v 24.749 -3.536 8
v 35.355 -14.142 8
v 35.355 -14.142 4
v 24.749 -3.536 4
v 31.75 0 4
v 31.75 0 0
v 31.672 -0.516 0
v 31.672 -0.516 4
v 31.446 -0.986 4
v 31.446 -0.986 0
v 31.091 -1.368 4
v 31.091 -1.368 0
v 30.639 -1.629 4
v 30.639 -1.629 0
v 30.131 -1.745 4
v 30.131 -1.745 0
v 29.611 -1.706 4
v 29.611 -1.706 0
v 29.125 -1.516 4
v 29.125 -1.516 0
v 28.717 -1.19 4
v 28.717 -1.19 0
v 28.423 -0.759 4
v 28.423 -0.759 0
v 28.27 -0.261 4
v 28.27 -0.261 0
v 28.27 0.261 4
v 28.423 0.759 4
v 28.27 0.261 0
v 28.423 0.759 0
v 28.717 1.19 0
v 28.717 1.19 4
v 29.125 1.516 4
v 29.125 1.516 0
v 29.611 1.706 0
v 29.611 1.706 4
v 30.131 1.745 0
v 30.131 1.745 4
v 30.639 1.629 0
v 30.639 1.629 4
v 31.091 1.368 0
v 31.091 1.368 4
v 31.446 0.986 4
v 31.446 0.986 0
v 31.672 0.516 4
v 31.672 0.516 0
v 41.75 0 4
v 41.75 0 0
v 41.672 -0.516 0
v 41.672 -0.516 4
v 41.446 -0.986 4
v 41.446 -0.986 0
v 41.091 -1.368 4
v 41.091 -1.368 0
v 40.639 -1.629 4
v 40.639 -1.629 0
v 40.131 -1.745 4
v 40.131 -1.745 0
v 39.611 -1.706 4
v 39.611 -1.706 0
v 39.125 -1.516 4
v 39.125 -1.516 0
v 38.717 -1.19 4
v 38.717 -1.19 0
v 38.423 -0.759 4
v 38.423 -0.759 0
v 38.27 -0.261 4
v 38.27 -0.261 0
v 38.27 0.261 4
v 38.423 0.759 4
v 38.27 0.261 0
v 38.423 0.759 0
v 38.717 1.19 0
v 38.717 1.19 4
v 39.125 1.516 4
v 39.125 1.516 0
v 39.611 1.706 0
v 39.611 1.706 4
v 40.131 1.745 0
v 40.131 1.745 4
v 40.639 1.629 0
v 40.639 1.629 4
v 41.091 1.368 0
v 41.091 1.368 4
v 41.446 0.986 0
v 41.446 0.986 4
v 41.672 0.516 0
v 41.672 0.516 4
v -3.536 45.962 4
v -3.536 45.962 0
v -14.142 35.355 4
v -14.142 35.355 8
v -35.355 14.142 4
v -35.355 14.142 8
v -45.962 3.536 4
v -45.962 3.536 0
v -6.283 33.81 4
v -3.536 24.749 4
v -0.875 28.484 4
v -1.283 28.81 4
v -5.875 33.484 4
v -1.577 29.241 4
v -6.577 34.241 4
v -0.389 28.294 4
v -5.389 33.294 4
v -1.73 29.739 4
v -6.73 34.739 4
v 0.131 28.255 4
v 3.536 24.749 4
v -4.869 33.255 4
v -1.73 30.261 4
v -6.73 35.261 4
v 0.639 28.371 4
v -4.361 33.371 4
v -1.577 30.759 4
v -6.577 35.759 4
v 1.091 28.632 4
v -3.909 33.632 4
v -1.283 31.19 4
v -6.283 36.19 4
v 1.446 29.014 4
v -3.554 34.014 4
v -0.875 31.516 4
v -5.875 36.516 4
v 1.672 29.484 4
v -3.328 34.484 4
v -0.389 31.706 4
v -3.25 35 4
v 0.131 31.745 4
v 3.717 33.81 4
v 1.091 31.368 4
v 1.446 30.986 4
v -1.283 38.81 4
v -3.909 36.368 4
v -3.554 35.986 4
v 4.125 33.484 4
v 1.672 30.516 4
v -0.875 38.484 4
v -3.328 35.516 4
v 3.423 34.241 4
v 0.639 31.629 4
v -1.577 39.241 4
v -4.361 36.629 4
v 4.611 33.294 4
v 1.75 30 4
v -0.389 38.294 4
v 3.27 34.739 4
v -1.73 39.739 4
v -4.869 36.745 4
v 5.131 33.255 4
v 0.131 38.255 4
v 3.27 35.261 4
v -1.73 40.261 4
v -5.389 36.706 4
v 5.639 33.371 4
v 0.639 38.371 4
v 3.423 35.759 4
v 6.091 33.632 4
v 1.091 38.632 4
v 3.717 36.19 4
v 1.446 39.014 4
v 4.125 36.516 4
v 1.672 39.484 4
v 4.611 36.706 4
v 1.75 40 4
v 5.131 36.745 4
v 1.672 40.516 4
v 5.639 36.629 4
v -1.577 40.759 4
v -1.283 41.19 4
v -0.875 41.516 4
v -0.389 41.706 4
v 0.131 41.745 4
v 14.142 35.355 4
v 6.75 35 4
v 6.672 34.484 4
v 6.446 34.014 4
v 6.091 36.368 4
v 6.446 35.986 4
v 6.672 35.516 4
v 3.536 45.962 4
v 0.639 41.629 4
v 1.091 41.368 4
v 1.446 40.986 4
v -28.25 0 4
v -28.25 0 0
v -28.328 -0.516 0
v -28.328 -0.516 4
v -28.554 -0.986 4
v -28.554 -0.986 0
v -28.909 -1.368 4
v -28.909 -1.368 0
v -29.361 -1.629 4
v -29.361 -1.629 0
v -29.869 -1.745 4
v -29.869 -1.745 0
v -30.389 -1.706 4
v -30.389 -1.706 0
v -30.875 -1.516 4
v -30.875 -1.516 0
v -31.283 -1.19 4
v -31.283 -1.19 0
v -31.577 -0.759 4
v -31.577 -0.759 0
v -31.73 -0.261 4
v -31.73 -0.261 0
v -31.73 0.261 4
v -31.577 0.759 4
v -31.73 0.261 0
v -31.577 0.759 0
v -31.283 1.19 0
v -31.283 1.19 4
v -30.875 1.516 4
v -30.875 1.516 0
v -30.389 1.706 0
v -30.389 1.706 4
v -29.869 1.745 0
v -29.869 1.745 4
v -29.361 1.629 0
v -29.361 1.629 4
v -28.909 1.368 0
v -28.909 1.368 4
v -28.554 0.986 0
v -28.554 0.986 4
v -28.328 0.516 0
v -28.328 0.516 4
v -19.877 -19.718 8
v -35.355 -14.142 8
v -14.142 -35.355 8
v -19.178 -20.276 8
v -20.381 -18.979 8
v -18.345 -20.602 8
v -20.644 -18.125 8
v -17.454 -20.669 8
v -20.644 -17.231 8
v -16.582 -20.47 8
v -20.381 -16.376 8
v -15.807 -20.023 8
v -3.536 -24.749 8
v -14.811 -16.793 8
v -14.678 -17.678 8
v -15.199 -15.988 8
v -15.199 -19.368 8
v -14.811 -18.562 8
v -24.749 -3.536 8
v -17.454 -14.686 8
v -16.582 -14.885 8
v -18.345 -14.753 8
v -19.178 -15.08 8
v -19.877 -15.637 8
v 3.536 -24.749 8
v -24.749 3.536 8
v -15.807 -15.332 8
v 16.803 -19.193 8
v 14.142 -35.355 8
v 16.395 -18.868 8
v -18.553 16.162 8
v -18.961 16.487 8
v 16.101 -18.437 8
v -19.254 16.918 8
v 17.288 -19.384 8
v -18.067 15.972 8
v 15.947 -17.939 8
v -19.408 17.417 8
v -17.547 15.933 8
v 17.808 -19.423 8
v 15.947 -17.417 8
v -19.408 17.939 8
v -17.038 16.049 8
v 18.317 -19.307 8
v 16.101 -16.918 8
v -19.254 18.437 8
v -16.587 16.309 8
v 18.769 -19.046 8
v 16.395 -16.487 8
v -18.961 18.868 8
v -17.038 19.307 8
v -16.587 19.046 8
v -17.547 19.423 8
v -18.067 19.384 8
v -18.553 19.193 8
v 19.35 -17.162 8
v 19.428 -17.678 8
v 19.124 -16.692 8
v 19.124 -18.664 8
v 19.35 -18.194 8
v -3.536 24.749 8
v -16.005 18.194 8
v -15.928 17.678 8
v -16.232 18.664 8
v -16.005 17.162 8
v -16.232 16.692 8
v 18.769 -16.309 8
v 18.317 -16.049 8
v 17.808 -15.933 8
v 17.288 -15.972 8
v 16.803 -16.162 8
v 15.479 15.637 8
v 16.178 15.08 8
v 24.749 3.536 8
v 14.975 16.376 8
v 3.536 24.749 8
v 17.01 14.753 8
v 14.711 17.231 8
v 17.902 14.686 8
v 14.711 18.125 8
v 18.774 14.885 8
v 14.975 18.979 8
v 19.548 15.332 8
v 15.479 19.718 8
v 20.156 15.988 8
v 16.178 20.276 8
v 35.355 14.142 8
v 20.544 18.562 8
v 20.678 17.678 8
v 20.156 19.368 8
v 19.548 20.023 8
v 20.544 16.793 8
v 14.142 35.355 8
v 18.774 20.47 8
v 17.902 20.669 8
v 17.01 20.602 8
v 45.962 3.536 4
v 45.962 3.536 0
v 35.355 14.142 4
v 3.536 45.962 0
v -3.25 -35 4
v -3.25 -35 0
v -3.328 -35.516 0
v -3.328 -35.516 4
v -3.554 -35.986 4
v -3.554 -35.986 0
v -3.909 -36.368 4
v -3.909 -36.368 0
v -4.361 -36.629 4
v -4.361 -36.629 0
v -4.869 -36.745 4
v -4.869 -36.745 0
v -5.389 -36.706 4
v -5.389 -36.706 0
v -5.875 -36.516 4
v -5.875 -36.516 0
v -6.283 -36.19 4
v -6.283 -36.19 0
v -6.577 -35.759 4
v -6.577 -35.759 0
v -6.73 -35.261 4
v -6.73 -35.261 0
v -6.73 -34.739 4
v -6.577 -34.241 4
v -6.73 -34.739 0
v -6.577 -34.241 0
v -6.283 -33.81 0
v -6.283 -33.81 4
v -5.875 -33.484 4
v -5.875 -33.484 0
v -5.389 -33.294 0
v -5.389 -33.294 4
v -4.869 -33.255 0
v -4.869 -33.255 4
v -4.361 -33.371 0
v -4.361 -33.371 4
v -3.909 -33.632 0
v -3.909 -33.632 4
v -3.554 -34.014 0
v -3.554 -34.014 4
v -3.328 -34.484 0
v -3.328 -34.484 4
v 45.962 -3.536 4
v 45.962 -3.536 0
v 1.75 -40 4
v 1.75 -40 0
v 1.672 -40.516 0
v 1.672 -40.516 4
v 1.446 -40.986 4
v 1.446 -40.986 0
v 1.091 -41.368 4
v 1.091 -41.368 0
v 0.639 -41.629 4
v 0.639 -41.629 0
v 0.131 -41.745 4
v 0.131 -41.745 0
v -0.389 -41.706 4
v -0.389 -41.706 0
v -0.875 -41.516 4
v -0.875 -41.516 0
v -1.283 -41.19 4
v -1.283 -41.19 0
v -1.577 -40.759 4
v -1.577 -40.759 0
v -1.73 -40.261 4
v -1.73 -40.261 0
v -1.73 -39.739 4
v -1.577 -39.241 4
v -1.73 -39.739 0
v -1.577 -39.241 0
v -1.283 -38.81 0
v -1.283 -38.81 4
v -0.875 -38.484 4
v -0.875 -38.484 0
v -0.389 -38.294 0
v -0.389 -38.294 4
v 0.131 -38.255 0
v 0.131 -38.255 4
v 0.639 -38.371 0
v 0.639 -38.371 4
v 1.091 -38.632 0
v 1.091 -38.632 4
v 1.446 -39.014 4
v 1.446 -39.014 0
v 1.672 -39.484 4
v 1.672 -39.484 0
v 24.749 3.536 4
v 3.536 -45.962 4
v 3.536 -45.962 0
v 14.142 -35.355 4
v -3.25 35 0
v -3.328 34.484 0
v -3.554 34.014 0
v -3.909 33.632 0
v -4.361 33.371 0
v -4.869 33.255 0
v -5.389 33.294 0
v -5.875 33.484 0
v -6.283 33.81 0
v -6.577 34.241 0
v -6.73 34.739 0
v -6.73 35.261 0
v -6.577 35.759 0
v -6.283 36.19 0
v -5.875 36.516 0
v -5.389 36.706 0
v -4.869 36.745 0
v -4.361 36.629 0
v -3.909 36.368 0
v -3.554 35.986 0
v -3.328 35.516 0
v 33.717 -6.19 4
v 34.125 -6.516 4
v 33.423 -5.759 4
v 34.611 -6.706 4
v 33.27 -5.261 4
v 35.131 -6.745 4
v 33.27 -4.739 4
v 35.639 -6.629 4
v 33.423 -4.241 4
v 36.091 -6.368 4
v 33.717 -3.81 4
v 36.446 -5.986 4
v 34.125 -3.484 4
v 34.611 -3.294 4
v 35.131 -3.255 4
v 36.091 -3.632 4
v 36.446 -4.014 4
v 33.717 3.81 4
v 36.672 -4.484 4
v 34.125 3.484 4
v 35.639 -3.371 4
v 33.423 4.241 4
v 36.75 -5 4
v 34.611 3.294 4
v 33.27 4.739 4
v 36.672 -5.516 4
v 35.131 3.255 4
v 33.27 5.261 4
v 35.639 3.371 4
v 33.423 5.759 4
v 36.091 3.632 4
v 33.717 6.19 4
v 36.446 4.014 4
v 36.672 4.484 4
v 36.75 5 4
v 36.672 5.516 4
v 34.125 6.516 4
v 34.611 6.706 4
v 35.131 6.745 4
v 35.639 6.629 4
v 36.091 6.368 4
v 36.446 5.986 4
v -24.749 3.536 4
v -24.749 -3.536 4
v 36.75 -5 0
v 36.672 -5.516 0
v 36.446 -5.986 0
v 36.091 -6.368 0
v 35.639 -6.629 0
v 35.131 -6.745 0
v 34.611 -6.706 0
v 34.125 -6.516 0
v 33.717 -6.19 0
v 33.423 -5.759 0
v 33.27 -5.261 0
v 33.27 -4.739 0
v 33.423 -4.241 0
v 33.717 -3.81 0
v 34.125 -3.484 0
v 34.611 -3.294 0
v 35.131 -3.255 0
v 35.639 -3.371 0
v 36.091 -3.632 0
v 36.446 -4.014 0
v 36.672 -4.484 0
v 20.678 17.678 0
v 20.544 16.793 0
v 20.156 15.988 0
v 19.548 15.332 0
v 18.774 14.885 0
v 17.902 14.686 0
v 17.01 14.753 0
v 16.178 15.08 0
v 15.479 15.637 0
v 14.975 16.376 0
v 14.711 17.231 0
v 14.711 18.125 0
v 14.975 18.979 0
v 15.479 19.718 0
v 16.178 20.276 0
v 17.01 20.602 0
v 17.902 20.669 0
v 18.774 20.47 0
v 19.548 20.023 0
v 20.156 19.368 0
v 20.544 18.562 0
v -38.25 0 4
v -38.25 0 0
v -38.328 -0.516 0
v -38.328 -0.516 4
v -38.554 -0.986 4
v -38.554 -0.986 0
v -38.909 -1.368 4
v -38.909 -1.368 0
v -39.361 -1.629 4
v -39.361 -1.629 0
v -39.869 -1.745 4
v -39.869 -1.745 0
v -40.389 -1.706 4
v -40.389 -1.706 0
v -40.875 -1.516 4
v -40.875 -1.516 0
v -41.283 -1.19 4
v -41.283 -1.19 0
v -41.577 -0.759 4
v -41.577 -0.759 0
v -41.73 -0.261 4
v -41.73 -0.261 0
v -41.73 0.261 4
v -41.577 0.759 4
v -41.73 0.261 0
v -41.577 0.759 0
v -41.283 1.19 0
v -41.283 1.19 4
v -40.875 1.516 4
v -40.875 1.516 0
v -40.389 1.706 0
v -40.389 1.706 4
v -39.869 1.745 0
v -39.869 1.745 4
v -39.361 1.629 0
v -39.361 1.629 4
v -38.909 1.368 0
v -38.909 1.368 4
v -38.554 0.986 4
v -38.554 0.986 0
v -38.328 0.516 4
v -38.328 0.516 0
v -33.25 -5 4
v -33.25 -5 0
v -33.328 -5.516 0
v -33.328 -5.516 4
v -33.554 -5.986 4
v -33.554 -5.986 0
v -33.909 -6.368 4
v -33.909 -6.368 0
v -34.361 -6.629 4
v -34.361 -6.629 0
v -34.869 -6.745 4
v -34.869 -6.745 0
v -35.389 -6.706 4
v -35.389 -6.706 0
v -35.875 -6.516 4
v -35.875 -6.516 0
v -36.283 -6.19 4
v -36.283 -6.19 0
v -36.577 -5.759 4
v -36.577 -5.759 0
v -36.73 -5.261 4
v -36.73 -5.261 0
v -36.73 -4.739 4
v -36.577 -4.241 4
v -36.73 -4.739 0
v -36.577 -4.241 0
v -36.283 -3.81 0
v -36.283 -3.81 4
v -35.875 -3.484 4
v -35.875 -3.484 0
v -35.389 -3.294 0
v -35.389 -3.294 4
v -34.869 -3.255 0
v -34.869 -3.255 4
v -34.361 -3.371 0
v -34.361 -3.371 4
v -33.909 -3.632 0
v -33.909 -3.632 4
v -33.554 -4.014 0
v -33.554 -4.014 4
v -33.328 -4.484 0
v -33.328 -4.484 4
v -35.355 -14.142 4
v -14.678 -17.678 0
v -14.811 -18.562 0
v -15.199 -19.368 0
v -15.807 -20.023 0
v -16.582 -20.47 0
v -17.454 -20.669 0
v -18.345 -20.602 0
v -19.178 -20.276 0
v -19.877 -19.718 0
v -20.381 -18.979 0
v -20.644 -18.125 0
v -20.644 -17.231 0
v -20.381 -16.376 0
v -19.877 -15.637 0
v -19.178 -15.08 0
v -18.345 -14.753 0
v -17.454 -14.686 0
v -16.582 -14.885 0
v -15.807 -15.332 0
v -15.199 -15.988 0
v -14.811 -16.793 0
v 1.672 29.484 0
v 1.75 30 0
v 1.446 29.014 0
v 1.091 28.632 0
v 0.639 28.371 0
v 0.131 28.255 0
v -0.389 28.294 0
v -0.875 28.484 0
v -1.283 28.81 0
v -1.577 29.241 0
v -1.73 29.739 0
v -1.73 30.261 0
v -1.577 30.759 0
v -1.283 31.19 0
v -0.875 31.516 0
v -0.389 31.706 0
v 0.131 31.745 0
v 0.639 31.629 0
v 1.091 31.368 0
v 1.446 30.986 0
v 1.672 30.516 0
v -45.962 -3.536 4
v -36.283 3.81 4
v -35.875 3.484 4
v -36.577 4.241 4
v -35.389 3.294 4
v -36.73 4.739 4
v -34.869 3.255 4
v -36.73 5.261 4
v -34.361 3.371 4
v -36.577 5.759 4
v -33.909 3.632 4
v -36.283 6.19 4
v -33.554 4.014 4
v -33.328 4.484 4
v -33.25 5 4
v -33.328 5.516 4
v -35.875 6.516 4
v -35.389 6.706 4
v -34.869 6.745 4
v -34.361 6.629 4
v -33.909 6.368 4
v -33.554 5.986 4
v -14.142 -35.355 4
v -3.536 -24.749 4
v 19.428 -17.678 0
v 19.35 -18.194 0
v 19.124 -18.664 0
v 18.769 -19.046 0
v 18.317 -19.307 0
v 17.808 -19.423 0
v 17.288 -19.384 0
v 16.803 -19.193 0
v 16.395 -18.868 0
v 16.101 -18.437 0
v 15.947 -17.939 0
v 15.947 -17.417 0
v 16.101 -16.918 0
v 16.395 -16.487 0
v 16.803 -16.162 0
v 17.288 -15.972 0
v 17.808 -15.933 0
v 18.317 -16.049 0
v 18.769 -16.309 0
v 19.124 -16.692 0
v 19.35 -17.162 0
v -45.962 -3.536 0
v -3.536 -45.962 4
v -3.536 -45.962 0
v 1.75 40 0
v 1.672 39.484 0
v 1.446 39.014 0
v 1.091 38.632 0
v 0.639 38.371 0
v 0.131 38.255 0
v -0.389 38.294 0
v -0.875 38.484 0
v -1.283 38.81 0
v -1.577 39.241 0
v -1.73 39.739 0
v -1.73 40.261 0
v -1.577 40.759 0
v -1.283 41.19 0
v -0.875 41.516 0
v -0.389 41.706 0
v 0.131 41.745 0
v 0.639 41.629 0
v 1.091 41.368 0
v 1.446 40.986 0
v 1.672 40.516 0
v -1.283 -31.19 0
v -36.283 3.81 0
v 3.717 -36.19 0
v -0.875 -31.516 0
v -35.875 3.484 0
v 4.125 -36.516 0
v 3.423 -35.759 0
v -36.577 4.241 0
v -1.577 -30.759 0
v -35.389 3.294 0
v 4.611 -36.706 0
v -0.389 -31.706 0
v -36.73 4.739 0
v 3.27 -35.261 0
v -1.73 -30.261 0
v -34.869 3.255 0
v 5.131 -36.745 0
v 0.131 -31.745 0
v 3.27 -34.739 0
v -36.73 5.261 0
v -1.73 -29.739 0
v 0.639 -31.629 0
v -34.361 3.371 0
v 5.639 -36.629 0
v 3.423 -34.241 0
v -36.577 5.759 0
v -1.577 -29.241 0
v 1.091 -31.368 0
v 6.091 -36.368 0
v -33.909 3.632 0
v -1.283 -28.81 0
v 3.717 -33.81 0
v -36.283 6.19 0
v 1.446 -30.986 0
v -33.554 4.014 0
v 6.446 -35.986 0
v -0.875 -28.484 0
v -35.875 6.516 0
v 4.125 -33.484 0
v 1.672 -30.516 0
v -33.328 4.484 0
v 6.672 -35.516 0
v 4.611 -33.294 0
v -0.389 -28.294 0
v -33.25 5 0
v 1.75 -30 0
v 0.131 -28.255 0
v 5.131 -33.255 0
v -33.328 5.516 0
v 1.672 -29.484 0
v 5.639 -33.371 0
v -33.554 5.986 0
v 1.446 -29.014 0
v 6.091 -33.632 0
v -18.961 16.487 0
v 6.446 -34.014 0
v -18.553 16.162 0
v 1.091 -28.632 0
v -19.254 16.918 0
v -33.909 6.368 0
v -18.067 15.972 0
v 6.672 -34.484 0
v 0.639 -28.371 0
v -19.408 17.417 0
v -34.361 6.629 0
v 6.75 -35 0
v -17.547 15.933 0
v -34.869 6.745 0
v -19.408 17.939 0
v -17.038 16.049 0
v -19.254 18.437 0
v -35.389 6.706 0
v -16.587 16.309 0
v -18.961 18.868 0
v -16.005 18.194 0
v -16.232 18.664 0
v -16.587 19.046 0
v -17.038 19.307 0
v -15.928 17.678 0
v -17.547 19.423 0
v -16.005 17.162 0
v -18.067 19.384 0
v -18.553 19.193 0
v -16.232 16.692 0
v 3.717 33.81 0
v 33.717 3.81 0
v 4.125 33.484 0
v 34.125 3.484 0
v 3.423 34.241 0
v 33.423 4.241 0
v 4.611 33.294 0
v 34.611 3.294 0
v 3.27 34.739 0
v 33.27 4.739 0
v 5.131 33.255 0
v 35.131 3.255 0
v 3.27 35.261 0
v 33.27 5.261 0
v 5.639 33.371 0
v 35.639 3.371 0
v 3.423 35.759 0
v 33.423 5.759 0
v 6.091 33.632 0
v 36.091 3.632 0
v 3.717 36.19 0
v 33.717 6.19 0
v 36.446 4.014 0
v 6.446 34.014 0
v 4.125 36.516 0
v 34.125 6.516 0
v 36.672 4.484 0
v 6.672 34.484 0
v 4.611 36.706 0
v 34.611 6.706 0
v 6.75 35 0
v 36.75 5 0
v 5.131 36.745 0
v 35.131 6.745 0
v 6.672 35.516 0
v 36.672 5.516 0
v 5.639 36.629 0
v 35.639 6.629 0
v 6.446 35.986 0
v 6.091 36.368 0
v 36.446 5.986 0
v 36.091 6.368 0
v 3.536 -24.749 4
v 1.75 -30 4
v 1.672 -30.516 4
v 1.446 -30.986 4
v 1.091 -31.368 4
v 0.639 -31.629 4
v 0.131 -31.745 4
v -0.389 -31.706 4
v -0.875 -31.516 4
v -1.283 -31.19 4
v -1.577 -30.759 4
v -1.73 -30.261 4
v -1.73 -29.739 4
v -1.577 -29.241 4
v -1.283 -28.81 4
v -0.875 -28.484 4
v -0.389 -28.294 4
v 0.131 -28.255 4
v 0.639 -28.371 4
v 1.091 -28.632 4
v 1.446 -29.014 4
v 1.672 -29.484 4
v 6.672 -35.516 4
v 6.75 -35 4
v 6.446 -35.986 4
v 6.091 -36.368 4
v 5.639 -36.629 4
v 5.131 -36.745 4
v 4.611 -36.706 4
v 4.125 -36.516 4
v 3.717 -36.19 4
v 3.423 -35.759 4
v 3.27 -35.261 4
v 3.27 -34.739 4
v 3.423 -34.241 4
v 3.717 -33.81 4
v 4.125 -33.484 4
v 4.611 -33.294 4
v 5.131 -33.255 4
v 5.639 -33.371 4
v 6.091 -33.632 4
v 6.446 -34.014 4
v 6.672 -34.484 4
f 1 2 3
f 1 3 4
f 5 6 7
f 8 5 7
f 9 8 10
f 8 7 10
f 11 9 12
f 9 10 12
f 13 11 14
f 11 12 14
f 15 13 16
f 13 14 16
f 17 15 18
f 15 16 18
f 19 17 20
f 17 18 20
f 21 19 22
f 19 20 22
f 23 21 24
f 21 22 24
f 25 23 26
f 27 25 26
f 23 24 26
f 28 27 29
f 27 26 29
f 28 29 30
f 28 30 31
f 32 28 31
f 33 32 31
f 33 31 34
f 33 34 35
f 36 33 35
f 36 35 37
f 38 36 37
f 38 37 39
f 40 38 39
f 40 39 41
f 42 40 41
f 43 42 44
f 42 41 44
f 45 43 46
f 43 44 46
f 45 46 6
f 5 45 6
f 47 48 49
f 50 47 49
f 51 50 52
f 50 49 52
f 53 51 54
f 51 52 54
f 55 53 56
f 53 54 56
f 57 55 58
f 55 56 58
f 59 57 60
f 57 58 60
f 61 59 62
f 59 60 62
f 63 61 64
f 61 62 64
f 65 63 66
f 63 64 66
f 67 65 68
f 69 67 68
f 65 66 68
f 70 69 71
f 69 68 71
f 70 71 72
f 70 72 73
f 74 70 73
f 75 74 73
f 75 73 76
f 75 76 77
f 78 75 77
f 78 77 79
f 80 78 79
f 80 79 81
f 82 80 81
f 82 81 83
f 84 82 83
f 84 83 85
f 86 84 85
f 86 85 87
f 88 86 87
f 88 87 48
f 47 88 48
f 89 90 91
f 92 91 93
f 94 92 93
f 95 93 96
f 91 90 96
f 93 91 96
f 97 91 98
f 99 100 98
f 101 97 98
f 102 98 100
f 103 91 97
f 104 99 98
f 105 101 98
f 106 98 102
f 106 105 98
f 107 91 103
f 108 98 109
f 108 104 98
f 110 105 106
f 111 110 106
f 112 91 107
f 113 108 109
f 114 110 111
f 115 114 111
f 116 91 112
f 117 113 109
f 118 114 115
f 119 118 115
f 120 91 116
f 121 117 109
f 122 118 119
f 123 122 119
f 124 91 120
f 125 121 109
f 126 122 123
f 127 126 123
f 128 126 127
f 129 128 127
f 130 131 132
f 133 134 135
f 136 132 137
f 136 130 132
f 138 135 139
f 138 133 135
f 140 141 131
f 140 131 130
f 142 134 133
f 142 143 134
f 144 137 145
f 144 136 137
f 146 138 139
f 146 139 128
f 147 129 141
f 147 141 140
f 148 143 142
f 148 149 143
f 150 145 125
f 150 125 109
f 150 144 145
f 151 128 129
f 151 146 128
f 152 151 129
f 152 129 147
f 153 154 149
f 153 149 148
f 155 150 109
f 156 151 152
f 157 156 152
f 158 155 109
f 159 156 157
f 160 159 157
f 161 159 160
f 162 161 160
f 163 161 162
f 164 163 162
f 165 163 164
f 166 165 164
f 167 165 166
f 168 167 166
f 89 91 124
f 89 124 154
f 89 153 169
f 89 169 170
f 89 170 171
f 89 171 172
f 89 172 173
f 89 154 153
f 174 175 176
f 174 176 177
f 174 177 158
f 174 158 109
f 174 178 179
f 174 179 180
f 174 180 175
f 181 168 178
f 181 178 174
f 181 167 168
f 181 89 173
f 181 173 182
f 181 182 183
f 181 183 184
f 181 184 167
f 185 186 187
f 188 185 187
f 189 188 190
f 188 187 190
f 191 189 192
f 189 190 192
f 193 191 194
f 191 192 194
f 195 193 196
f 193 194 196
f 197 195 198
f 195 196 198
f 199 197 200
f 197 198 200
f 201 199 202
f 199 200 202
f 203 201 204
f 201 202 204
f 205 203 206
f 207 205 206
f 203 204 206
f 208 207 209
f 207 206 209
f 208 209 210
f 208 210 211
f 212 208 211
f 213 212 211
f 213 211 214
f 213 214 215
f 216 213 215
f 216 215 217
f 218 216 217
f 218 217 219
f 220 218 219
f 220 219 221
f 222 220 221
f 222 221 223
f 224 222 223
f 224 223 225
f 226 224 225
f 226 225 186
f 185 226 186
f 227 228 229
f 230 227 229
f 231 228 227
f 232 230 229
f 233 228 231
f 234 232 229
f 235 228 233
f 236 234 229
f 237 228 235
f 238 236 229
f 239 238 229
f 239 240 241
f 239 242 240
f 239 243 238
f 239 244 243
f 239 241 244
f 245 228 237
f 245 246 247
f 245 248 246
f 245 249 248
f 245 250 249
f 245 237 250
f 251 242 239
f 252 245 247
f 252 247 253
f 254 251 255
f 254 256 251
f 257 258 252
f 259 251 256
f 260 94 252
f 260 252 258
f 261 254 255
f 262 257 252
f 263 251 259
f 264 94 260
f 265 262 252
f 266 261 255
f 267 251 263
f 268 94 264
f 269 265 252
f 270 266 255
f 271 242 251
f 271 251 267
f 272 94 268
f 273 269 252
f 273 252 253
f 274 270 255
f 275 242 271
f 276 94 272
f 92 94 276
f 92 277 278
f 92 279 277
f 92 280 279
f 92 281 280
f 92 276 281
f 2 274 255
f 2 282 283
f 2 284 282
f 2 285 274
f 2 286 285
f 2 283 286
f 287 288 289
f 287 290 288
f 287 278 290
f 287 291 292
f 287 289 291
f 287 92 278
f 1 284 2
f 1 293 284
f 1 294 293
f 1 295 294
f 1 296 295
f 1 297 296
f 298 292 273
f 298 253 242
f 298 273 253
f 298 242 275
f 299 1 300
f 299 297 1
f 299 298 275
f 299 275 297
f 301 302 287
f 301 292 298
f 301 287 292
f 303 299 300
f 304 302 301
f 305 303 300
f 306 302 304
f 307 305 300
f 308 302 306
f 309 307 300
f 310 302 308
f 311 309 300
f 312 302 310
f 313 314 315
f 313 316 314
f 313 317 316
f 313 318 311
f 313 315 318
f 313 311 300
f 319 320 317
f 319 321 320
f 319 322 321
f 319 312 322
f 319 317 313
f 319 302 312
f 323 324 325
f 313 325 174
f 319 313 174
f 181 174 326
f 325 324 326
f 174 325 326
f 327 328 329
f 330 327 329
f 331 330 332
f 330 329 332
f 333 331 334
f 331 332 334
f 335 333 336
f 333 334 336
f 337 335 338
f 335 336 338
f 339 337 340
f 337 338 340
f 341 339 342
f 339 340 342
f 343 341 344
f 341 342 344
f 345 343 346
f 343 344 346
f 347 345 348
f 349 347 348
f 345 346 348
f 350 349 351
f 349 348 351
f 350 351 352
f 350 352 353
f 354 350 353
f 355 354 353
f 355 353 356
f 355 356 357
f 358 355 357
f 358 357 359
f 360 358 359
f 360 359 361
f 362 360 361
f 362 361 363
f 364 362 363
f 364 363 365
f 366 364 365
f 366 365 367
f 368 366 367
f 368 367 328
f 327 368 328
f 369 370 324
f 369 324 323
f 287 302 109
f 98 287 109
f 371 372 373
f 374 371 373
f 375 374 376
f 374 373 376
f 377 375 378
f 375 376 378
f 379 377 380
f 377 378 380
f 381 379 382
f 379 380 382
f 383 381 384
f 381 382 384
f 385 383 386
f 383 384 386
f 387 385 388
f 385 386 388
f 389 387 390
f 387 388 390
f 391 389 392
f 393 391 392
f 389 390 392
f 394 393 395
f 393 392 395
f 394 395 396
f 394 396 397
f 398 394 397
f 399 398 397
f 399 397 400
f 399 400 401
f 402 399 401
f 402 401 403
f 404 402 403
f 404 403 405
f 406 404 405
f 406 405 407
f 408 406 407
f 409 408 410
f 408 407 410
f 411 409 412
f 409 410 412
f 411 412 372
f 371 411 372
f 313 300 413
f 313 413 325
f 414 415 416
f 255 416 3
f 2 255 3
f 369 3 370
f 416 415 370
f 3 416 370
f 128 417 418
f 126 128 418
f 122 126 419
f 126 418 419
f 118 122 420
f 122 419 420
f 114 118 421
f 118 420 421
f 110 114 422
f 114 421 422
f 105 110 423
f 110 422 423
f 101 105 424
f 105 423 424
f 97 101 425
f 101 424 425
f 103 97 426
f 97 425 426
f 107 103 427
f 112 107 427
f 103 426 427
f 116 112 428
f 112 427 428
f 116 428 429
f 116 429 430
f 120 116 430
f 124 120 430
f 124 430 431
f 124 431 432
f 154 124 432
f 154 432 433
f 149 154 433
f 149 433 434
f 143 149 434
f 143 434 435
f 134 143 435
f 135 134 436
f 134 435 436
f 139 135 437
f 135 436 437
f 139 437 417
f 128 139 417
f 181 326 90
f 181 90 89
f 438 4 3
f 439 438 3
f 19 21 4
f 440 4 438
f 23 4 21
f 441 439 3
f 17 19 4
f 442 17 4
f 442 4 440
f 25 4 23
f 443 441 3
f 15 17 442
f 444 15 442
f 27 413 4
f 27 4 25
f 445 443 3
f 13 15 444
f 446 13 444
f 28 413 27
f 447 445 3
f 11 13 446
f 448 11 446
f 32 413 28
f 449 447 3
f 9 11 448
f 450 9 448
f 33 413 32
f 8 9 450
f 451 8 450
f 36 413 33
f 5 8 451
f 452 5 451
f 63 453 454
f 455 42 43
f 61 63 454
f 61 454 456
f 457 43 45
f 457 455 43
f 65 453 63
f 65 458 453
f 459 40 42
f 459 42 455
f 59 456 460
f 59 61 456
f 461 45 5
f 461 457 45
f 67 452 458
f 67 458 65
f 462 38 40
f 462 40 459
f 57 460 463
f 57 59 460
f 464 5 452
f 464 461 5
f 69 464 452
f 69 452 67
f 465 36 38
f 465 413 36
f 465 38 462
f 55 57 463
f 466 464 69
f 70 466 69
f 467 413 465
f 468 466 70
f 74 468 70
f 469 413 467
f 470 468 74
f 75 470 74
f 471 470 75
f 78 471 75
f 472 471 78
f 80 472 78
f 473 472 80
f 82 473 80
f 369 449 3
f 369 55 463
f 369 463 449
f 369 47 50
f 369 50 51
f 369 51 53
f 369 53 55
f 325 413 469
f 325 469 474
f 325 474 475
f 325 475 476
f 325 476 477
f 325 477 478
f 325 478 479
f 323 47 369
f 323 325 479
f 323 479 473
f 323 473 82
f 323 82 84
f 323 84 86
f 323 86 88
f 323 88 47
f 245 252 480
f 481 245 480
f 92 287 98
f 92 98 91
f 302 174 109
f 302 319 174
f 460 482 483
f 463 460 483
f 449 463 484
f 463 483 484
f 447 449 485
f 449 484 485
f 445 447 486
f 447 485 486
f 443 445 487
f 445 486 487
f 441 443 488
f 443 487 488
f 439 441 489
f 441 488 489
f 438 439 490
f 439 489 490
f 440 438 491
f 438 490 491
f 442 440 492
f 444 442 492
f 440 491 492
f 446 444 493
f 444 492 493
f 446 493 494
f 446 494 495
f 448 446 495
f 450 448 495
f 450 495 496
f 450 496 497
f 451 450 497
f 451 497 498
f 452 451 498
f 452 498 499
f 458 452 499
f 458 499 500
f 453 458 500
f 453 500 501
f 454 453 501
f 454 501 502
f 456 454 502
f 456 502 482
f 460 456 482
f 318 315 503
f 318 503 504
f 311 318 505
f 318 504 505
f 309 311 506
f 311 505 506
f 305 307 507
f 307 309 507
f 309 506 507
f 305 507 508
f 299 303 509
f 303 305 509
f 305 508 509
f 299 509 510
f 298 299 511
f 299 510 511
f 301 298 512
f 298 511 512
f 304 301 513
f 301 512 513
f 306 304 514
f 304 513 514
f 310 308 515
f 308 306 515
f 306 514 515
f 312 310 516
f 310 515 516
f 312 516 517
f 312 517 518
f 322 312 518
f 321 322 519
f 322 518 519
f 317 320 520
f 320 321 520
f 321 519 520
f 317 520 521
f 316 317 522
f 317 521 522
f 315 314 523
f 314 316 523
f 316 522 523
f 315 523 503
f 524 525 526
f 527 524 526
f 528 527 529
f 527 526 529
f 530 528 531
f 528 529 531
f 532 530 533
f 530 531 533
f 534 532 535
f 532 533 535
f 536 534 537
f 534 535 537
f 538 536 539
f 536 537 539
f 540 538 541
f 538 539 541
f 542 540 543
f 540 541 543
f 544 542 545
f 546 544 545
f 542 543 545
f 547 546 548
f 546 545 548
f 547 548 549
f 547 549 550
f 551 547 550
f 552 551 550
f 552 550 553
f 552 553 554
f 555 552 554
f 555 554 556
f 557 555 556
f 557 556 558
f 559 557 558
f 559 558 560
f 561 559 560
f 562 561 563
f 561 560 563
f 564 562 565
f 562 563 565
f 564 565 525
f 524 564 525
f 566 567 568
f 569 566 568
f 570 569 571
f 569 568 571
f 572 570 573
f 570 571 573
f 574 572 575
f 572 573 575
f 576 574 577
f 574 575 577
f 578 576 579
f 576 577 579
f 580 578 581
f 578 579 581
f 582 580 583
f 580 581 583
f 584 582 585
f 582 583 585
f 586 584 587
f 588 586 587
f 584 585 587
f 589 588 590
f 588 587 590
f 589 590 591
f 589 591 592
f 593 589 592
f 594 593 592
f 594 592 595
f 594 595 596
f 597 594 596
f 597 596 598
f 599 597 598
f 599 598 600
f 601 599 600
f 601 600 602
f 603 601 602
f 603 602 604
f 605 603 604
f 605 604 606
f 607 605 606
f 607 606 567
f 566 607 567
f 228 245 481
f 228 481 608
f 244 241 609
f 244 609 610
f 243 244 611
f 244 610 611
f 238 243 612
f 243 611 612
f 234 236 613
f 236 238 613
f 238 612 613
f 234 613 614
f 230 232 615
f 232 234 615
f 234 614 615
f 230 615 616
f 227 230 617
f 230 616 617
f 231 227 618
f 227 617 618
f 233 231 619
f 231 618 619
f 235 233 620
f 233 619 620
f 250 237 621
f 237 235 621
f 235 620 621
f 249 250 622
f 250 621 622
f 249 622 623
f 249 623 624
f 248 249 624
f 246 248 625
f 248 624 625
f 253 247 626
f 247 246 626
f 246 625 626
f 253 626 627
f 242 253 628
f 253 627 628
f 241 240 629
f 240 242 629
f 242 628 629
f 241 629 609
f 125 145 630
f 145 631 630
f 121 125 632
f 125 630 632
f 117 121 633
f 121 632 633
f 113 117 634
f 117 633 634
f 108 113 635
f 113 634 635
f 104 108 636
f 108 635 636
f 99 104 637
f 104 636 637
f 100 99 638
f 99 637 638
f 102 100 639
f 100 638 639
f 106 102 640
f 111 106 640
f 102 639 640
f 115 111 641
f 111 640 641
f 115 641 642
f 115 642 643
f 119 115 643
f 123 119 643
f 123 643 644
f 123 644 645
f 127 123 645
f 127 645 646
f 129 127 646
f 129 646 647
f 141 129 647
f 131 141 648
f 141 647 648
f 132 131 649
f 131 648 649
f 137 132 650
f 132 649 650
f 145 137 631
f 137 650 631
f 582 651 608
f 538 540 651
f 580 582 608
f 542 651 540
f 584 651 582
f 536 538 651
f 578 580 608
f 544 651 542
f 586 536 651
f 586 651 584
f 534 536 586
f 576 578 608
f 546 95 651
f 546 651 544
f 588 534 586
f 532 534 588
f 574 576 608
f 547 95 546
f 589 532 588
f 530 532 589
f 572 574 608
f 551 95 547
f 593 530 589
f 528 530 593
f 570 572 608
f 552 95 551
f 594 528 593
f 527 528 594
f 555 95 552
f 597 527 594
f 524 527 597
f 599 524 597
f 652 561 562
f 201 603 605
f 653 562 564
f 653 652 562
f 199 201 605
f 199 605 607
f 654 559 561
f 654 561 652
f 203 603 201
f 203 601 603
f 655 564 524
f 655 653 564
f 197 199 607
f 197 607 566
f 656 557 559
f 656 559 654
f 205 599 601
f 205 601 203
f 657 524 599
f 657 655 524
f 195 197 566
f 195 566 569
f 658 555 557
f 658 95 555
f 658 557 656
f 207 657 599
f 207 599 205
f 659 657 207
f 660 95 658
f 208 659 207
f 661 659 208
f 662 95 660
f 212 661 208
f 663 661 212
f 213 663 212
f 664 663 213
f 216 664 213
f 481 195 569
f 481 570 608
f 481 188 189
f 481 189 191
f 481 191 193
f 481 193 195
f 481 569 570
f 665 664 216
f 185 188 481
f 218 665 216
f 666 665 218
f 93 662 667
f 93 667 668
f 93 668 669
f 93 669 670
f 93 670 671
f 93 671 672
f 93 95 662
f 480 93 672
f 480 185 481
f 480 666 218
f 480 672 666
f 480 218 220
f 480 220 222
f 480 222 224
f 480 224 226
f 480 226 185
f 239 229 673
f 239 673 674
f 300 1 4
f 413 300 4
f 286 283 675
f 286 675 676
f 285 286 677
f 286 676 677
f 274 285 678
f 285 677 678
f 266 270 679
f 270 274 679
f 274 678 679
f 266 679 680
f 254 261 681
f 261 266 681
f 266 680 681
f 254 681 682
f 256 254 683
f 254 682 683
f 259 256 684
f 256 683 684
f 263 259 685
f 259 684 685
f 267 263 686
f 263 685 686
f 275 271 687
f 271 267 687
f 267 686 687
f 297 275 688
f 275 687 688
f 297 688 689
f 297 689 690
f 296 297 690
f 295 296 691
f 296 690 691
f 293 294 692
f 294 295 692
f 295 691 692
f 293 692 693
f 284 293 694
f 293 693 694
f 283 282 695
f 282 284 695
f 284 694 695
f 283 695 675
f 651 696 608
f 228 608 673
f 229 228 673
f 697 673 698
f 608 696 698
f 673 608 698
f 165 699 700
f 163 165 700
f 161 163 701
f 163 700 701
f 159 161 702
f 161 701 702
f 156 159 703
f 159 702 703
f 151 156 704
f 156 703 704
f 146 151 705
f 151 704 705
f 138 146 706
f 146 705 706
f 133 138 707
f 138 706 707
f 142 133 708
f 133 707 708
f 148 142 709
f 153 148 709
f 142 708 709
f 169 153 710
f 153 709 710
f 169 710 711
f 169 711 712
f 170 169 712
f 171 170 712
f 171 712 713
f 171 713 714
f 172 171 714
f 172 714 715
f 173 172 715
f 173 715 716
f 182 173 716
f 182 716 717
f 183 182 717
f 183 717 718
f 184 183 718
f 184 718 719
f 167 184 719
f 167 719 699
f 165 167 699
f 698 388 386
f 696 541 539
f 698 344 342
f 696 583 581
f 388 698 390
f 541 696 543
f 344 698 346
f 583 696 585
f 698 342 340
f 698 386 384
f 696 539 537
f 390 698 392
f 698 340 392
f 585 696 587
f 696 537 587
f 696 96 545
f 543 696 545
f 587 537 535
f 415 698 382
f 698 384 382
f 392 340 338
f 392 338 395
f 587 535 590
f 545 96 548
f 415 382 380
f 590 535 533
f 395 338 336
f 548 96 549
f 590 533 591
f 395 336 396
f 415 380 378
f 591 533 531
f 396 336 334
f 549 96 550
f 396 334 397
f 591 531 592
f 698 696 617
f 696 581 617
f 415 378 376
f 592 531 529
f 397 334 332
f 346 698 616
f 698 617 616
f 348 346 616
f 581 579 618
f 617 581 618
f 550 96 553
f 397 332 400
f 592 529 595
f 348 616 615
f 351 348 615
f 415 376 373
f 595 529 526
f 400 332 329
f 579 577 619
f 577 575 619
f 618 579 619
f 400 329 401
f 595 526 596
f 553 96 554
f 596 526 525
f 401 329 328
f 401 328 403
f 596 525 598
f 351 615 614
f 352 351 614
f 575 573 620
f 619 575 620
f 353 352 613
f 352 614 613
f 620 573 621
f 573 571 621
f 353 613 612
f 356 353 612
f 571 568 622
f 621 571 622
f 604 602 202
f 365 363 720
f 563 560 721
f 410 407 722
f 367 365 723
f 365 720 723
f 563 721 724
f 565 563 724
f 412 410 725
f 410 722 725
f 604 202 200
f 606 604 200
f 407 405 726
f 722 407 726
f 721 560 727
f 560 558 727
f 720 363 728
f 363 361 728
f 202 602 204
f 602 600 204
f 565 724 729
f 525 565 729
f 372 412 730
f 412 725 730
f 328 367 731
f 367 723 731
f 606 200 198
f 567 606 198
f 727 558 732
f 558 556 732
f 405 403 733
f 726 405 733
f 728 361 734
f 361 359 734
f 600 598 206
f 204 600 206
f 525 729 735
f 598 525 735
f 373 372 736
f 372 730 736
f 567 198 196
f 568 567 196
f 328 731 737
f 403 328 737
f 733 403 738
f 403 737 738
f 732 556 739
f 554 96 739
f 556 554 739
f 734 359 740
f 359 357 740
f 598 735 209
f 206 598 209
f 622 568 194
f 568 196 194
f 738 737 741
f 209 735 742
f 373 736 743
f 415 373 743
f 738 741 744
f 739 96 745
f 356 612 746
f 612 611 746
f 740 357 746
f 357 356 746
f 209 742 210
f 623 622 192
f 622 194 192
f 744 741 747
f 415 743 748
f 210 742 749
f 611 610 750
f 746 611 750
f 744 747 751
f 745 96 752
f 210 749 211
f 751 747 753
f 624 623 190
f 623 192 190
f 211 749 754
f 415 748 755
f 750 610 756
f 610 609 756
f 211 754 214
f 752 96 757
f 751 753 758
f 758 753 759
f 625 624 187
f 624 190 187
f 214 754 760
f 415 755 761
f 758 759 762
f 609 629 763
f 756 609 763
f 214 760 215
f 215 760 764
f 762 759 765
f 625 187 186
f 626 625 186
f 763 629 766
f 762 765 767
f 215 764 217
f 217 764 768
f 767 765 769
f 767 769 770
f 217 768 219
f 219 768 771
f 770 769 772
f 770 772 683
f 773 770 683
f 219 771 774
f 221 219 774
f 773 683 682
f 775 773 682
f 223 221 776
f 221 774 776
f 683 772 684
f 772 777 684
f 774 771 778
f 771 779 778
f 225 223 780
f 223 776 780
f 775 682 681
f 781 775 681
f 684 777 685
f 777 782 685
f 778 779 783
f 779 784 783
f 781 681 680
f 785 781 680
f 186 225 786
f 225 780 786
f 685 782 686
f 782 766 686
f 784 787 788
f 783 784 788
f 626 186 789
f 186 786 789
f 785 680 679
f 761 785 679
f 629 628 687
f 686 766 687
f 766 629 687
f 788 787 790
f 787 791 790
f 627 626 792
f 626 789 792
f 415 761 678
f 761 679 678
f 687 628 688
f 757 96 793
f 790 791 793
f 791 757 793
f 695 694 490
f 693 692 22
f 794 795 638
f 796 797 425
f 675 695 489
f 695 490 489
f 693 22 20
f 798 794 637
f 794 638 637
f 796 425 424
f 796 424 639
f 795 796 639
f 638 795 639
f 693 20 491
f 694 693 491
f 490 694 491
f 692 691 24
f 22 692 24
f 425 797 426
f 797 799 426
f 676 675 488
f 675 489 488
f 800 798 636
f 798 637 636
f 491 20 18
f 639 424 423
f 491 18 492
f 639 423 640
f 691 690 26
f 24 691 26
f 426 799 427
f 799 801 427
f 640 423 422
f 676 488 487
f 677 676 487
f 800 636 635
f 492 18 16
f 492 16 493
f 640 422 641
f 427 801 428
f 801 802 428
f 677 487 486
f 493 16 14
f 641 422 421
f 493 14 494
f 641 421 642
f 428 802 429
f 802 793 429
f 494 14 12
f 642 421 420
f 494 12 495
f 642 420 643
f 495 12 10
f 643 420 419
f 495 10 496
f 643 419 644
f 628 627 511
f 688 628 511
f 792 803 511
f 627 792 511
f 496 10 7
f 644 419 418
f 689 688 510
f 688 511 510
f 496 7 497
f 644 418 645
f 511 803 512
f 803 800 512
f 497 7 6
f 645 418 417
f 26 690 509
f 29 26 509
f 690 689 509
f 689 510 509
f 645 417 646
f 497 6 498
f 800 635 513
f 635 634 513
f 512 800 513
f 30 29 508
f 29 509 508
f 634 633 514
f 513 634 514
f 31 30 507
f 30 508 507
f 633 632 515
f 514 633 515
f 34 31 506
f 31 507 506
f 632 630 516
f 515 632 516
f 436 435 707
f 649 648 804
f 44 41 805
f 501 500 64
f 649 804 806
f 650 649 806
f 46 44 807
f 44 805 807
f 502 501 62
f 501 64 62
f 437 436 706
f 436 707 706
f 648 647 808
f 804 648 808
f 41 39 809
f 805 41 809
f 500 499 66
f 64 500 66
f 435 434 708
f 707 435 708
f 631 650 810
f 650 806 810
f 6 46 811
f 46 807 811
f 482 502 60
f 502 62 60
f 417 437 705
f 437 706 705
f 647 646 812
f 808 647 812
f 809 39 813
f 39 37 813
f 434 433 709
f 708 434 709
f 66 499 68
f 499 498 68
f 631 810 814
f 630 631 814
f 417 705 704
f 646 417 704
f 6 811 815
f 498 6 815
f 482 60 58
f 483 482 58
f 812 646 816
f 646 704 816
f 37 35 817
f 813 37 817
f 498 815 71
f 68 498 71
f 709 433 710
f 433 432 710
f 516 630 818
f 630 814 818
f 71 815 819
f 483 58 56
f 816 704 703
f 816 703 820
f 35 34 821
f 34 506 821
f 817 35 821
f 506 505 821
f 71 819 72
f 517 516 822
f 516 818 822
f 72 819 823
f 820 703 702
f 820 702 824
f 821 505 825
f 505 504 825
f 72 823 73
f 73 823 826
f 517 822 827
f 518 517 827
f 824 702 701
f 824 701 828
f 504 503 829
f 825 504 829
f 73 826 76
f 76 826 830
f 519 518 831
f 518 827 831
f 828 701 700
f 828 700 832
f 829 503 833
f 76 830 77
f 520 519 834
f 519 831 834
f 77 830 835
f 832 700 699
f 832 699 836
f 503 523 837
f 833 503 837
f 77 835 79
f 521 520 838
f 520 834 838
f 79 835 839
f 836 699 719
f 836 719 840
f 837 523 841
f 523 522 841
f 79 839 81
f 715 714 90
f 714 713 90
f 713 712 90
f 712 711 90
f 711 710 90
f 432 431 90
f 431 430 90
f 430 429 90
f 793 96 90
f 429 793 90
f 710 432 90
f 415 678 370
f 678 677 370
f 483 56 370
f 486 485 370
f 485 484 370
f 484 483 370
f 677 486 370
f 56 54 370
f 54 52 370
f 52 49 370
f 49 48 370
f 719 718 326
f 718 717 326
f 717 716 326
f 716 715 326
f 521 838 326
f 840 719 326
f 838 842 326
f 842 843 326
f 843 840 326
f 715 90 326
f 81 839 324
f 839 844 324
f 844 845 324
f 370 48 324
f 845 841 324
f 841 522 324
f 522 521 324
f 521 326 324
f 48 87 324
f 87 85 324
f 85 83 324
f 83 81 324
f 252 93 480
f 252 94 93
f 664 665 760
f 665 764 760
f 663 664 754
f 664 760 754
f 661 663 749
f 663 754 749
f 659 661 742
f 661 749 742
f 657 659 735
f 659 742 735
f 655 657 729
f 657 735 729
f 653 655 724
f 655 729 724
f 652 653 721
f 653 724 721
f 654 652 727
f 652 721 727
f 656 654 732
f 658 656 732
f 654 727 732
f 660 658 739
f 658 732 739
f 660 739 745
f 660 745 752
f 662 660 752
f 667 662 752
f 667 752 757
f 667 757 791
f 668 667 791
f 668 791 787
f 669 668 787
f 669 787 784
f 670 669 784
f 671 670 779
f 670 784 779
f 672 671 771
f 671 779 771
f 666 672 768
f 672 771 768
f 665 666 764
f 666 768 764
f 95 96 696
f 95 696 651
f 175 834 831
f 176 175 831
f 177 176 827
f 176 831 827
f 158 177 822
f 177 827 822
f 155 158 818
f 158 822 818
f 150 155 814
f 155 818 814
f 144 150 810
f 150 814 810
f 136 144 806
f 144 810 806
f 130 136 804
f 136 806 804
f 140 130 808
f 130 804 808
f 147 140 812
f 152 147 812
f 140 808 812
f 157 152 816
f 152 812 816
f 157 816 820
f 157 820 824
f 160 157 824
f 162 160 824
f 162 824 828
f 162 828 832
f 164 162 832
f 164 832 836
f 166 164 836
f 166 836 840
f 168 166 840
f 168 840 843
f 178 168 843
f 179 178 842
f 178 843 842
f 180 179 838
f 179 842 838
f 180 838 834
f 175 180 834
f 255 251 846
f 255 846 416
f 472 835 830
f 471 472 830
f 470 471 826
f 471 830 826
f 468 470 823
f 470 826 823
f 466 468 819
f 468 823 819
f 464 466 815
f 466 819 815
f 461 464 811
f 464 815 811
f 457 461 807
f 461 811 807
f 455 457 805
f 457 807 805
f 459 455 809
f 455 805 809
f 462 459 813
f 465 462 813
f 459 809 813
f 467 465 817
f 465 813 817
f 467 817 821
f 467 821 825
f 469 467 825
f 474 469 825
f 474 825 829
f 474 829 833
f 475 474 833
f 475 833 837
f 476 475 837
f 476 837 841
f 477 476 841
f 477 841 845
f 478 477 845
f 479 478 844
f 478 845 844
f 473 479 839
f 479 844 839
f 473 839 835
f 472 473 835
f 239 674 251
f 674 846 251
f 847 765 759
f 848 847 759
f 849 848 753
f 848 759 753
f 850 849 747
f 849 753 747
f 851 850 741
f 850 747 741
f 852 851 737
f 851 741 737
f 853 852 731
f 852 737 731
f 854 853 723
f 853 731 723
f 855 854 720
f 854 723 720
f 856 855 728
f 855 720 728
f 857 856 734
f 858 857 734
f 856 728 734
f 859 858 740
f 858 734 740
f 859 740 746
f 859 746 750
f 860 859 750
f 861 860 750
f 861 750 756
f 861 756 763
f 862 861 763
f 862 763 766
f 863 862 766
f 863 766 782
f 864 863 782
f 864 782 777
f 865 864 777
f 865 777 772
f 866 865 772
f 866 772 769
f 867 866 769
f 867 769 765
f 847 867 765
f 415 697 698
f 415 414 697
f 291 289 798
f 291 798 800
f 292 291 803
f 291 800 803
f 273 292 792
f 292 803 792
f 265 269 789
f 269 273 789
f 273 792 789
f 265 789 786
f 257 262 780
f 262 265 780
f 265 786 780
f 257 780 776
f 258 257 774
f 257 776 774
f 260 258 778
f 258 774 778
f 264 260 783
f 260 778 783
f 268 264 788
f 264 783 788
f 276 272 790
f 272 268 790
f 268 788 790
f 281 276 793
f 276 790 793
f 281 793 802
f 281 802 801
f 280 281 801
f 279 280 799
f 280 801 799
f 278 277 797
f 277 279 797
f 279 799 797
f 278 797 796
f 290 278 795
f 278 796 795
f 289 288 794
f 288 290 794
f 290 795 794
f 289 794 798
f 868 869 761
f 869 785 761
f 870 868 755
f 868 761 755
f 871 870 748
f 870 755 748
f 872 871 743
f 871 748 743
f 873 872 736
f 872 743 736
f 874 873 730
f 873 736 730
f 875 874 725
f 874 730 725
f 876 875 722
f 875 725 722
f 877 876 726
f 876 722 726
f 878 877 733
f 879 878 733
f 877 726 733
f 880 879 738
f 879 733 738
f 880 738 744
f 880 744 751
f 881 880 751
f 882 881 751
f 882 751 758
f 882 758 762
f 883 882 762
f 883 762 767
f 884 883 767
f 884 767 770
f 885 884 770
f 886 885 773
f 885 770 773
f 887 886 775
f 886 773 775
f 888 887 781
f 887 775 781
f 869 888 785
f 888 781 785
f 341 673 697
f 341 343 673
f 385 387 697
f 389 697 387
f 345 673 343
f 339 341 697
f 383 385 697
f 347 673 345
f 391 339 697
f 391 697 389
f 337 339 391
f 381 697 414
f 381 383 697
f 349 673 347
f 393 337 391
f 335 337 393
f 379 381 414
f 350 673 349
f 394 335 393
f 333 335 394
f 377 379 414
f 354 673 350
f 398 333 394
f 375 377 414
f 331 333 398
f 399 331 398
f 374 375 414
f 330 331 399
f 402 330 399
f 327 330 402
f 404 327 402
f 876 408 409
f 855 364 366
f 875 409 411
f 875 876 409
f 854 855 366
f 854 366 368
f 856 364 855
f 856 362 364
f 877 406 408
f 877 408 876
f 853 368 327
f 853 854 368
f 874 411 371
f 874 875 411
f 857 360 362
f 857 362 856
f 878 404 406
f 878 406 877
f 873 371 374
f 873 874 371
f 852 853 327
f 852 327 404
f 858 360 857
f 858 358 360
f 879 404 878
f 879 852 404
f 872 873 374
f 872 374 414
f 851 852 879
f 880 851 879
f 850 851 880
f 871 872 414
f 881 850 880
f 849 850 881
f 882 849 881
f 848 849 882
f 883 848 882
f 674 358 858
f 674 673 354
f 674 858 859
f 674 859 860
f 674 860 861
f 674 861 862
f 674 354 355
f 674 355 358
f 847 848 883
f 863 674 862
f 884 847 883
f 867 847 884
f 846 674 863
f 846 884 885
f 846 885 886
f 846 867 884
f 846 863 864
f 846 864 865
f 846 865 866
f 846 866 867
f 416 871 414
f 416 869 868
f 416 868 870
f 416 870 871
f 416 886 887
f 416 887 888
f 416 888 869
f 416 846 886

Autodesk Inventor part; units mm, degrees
ref_plane "YZ Plane" through (0, 0, 0) normal (1, 0, 0) x (0, 1, 0)
ref_plane "XZ Plane" through (0, 0, 0) normal (0, 1, 0) x (-1, 0, 0)
ref_plane "XY Plane" through (0, 0, 0) normal (0, 0, 1) x (1, 0, 0)
sketch "スケッチ2" plane through (0, 0, 0) normal (0, 0, 1) x (1, 0, 0)
  line L0 (0, -49.4975) -> (49.4975, 0)
  line L1 (49.4975, 0) -> (0, 49.4975)
  line L2 (0, 49.4975) -> (-49.4975, 0)
  line L3 (-49.4975, 0) -> (0, -49.4975)
  line L4 (0, -49.4975) -> (0, 49.4975) construction
  line L5 (49.4975, 0) -> (-49.4975, 0) construction
  circle A0 centre (-5, 35) radius 1.75
  circle A1 centre (5, 35) radius 1.75
  circle A2 centre (-35, -5) radius 1.75
  circle A3 centre (-35, 5) radius 1.75
  circle A4 centre (5, -35) radius 1.75
  circle A5 centre (-5, -35) radius 1.75
  circle A6 centre (35, 5) radius 1.75
  circle A7 centre (35, -5) radius 1.75
  line L6 (-24.7487, 24.7487) -> (24.7487, -24.7487) construction
  line L7 (24.7487, 24.7487) -> (-24.7487, -24.7487) construction
  circle A8 centre (17.6777, 17.6777) radius 3
  circle A9 centre (-17.6777, 17.6777) radius 1.75
  circle A10 centre (-17.6777, -17.6777) radius 3
  circle A11 centre (17.6777, -17.6777) radius 1.75
  circle A12 centre (-30, 0) radius 1.75
  circle A13 centre (-40, 0) radius 1.75
  line L8 (-35, -5) -> (-35, 5) construction
  circle A14 centre (0, -30) radius 1.75
  circle A15 centre (0, -40) radius 1.75
  circle A16 centre (30, 0) radius 1.75
  circle A17 centre (40, 0) radius 1.75
  circle A18 centre (0, 30) radius 1.75
  circle A19 centre (0, 40) radius 1.75
  point P0 (0, 0)
  dimension "d1" = 3.5
  dimension "d2" = 5
  dimension "d3" = 35
  dimension "d6" = 360
  dimension "d12" = 6
  dimension "d13" = 3.5
  dimension "d14" = 25
  dimension "d15" = 25
  dimension "d29" = 70
  dimension "d30" = 5
  dimension "d31" = 5
  dimension "d34" = 360
extrude "押し出し1" add sketch "スケッチ2" along normal blind 8
chamfer "面取り1" distance 5 angle 45 4 edges at (0, -49.4975, 4) (49.4975, 0, 4) (0, 49.4975, 4) (-49.4975, 0, 4)
sketch "スケッチ4" plane through (0, 0, 8) normal (0, 0, 1) x (1, 0, 0)
  line L0 (3.5355, -45.9619) -> (45.9619, -3.5355) projected
  line L1 (-45.9619, -3.5355) -> (-3.5355, -45.9619) projected
  line L2 (0, -21.2132) -> (14.1421, -35.3553)
  line L3 (14.1421, -35.3553) -> (0, -49.4975)
  line L4 (0, -49.4975) -> (-14.1421, -35.3553)
  line L5 (-14.1421, -35.3553) -> (0, -21.2132)
  line L6 (21.2132, 0) -> (35.3553, 14.1421)
  line L7 (35.3553, 14.1421) -> (49.4975, 0)
  line L8 (49.4975, 0) -> (35.3553, -14.1421)
  line L9 (35.3553, -14.1421) -> (21.2132, 0)
  line L10 (0, 21.2132) -> (-14.1421, 35.3553)
  line L11 (-14.1421, 35.3553) -> (0, 49.4975)
  line L12 (0, 49.4975) -> (14.1421, 35.3553)
  line L13 (14.1421, 35.3553) -> (0, 21.2132)
  line L14 (-21.2132, 0) -> (-35.3553, -14.1421)
  line L15 (-35.3553, -14.1421) -> (-49.4975, 0)
  line L16 (-49.4975, 0) -> (-35.3553, 14.1421)
  line L17 (-35.3553, 14.1421) -> (-21.2132, 0)
  point P0 (0, 0)
  point P1 (45.9619, 3.5355)
  point P2 (45.9619, -3.5355)
  point P3 (-3.5355, 45.9619)
  point P4 (3.5355, 45.9619)
  point P5 (-45.9619, -3.5355)
  point P6 (-45.9619, 3.5355)
  dimension "d36" = 20
  dimension "d37" = 20
  dimension "d40" = 360
extrude "押し出し3" cut sketch "スケッチ4" against normal blind 4
chamfer "面取り2" distance 5 angle 45 4 edges at (21.2132, 0, 6) (0, -21.2132, 6) (-21.2132, 0, 6) (0, 21.2132, 6)
properties part number "ワイヤジンバル1"
